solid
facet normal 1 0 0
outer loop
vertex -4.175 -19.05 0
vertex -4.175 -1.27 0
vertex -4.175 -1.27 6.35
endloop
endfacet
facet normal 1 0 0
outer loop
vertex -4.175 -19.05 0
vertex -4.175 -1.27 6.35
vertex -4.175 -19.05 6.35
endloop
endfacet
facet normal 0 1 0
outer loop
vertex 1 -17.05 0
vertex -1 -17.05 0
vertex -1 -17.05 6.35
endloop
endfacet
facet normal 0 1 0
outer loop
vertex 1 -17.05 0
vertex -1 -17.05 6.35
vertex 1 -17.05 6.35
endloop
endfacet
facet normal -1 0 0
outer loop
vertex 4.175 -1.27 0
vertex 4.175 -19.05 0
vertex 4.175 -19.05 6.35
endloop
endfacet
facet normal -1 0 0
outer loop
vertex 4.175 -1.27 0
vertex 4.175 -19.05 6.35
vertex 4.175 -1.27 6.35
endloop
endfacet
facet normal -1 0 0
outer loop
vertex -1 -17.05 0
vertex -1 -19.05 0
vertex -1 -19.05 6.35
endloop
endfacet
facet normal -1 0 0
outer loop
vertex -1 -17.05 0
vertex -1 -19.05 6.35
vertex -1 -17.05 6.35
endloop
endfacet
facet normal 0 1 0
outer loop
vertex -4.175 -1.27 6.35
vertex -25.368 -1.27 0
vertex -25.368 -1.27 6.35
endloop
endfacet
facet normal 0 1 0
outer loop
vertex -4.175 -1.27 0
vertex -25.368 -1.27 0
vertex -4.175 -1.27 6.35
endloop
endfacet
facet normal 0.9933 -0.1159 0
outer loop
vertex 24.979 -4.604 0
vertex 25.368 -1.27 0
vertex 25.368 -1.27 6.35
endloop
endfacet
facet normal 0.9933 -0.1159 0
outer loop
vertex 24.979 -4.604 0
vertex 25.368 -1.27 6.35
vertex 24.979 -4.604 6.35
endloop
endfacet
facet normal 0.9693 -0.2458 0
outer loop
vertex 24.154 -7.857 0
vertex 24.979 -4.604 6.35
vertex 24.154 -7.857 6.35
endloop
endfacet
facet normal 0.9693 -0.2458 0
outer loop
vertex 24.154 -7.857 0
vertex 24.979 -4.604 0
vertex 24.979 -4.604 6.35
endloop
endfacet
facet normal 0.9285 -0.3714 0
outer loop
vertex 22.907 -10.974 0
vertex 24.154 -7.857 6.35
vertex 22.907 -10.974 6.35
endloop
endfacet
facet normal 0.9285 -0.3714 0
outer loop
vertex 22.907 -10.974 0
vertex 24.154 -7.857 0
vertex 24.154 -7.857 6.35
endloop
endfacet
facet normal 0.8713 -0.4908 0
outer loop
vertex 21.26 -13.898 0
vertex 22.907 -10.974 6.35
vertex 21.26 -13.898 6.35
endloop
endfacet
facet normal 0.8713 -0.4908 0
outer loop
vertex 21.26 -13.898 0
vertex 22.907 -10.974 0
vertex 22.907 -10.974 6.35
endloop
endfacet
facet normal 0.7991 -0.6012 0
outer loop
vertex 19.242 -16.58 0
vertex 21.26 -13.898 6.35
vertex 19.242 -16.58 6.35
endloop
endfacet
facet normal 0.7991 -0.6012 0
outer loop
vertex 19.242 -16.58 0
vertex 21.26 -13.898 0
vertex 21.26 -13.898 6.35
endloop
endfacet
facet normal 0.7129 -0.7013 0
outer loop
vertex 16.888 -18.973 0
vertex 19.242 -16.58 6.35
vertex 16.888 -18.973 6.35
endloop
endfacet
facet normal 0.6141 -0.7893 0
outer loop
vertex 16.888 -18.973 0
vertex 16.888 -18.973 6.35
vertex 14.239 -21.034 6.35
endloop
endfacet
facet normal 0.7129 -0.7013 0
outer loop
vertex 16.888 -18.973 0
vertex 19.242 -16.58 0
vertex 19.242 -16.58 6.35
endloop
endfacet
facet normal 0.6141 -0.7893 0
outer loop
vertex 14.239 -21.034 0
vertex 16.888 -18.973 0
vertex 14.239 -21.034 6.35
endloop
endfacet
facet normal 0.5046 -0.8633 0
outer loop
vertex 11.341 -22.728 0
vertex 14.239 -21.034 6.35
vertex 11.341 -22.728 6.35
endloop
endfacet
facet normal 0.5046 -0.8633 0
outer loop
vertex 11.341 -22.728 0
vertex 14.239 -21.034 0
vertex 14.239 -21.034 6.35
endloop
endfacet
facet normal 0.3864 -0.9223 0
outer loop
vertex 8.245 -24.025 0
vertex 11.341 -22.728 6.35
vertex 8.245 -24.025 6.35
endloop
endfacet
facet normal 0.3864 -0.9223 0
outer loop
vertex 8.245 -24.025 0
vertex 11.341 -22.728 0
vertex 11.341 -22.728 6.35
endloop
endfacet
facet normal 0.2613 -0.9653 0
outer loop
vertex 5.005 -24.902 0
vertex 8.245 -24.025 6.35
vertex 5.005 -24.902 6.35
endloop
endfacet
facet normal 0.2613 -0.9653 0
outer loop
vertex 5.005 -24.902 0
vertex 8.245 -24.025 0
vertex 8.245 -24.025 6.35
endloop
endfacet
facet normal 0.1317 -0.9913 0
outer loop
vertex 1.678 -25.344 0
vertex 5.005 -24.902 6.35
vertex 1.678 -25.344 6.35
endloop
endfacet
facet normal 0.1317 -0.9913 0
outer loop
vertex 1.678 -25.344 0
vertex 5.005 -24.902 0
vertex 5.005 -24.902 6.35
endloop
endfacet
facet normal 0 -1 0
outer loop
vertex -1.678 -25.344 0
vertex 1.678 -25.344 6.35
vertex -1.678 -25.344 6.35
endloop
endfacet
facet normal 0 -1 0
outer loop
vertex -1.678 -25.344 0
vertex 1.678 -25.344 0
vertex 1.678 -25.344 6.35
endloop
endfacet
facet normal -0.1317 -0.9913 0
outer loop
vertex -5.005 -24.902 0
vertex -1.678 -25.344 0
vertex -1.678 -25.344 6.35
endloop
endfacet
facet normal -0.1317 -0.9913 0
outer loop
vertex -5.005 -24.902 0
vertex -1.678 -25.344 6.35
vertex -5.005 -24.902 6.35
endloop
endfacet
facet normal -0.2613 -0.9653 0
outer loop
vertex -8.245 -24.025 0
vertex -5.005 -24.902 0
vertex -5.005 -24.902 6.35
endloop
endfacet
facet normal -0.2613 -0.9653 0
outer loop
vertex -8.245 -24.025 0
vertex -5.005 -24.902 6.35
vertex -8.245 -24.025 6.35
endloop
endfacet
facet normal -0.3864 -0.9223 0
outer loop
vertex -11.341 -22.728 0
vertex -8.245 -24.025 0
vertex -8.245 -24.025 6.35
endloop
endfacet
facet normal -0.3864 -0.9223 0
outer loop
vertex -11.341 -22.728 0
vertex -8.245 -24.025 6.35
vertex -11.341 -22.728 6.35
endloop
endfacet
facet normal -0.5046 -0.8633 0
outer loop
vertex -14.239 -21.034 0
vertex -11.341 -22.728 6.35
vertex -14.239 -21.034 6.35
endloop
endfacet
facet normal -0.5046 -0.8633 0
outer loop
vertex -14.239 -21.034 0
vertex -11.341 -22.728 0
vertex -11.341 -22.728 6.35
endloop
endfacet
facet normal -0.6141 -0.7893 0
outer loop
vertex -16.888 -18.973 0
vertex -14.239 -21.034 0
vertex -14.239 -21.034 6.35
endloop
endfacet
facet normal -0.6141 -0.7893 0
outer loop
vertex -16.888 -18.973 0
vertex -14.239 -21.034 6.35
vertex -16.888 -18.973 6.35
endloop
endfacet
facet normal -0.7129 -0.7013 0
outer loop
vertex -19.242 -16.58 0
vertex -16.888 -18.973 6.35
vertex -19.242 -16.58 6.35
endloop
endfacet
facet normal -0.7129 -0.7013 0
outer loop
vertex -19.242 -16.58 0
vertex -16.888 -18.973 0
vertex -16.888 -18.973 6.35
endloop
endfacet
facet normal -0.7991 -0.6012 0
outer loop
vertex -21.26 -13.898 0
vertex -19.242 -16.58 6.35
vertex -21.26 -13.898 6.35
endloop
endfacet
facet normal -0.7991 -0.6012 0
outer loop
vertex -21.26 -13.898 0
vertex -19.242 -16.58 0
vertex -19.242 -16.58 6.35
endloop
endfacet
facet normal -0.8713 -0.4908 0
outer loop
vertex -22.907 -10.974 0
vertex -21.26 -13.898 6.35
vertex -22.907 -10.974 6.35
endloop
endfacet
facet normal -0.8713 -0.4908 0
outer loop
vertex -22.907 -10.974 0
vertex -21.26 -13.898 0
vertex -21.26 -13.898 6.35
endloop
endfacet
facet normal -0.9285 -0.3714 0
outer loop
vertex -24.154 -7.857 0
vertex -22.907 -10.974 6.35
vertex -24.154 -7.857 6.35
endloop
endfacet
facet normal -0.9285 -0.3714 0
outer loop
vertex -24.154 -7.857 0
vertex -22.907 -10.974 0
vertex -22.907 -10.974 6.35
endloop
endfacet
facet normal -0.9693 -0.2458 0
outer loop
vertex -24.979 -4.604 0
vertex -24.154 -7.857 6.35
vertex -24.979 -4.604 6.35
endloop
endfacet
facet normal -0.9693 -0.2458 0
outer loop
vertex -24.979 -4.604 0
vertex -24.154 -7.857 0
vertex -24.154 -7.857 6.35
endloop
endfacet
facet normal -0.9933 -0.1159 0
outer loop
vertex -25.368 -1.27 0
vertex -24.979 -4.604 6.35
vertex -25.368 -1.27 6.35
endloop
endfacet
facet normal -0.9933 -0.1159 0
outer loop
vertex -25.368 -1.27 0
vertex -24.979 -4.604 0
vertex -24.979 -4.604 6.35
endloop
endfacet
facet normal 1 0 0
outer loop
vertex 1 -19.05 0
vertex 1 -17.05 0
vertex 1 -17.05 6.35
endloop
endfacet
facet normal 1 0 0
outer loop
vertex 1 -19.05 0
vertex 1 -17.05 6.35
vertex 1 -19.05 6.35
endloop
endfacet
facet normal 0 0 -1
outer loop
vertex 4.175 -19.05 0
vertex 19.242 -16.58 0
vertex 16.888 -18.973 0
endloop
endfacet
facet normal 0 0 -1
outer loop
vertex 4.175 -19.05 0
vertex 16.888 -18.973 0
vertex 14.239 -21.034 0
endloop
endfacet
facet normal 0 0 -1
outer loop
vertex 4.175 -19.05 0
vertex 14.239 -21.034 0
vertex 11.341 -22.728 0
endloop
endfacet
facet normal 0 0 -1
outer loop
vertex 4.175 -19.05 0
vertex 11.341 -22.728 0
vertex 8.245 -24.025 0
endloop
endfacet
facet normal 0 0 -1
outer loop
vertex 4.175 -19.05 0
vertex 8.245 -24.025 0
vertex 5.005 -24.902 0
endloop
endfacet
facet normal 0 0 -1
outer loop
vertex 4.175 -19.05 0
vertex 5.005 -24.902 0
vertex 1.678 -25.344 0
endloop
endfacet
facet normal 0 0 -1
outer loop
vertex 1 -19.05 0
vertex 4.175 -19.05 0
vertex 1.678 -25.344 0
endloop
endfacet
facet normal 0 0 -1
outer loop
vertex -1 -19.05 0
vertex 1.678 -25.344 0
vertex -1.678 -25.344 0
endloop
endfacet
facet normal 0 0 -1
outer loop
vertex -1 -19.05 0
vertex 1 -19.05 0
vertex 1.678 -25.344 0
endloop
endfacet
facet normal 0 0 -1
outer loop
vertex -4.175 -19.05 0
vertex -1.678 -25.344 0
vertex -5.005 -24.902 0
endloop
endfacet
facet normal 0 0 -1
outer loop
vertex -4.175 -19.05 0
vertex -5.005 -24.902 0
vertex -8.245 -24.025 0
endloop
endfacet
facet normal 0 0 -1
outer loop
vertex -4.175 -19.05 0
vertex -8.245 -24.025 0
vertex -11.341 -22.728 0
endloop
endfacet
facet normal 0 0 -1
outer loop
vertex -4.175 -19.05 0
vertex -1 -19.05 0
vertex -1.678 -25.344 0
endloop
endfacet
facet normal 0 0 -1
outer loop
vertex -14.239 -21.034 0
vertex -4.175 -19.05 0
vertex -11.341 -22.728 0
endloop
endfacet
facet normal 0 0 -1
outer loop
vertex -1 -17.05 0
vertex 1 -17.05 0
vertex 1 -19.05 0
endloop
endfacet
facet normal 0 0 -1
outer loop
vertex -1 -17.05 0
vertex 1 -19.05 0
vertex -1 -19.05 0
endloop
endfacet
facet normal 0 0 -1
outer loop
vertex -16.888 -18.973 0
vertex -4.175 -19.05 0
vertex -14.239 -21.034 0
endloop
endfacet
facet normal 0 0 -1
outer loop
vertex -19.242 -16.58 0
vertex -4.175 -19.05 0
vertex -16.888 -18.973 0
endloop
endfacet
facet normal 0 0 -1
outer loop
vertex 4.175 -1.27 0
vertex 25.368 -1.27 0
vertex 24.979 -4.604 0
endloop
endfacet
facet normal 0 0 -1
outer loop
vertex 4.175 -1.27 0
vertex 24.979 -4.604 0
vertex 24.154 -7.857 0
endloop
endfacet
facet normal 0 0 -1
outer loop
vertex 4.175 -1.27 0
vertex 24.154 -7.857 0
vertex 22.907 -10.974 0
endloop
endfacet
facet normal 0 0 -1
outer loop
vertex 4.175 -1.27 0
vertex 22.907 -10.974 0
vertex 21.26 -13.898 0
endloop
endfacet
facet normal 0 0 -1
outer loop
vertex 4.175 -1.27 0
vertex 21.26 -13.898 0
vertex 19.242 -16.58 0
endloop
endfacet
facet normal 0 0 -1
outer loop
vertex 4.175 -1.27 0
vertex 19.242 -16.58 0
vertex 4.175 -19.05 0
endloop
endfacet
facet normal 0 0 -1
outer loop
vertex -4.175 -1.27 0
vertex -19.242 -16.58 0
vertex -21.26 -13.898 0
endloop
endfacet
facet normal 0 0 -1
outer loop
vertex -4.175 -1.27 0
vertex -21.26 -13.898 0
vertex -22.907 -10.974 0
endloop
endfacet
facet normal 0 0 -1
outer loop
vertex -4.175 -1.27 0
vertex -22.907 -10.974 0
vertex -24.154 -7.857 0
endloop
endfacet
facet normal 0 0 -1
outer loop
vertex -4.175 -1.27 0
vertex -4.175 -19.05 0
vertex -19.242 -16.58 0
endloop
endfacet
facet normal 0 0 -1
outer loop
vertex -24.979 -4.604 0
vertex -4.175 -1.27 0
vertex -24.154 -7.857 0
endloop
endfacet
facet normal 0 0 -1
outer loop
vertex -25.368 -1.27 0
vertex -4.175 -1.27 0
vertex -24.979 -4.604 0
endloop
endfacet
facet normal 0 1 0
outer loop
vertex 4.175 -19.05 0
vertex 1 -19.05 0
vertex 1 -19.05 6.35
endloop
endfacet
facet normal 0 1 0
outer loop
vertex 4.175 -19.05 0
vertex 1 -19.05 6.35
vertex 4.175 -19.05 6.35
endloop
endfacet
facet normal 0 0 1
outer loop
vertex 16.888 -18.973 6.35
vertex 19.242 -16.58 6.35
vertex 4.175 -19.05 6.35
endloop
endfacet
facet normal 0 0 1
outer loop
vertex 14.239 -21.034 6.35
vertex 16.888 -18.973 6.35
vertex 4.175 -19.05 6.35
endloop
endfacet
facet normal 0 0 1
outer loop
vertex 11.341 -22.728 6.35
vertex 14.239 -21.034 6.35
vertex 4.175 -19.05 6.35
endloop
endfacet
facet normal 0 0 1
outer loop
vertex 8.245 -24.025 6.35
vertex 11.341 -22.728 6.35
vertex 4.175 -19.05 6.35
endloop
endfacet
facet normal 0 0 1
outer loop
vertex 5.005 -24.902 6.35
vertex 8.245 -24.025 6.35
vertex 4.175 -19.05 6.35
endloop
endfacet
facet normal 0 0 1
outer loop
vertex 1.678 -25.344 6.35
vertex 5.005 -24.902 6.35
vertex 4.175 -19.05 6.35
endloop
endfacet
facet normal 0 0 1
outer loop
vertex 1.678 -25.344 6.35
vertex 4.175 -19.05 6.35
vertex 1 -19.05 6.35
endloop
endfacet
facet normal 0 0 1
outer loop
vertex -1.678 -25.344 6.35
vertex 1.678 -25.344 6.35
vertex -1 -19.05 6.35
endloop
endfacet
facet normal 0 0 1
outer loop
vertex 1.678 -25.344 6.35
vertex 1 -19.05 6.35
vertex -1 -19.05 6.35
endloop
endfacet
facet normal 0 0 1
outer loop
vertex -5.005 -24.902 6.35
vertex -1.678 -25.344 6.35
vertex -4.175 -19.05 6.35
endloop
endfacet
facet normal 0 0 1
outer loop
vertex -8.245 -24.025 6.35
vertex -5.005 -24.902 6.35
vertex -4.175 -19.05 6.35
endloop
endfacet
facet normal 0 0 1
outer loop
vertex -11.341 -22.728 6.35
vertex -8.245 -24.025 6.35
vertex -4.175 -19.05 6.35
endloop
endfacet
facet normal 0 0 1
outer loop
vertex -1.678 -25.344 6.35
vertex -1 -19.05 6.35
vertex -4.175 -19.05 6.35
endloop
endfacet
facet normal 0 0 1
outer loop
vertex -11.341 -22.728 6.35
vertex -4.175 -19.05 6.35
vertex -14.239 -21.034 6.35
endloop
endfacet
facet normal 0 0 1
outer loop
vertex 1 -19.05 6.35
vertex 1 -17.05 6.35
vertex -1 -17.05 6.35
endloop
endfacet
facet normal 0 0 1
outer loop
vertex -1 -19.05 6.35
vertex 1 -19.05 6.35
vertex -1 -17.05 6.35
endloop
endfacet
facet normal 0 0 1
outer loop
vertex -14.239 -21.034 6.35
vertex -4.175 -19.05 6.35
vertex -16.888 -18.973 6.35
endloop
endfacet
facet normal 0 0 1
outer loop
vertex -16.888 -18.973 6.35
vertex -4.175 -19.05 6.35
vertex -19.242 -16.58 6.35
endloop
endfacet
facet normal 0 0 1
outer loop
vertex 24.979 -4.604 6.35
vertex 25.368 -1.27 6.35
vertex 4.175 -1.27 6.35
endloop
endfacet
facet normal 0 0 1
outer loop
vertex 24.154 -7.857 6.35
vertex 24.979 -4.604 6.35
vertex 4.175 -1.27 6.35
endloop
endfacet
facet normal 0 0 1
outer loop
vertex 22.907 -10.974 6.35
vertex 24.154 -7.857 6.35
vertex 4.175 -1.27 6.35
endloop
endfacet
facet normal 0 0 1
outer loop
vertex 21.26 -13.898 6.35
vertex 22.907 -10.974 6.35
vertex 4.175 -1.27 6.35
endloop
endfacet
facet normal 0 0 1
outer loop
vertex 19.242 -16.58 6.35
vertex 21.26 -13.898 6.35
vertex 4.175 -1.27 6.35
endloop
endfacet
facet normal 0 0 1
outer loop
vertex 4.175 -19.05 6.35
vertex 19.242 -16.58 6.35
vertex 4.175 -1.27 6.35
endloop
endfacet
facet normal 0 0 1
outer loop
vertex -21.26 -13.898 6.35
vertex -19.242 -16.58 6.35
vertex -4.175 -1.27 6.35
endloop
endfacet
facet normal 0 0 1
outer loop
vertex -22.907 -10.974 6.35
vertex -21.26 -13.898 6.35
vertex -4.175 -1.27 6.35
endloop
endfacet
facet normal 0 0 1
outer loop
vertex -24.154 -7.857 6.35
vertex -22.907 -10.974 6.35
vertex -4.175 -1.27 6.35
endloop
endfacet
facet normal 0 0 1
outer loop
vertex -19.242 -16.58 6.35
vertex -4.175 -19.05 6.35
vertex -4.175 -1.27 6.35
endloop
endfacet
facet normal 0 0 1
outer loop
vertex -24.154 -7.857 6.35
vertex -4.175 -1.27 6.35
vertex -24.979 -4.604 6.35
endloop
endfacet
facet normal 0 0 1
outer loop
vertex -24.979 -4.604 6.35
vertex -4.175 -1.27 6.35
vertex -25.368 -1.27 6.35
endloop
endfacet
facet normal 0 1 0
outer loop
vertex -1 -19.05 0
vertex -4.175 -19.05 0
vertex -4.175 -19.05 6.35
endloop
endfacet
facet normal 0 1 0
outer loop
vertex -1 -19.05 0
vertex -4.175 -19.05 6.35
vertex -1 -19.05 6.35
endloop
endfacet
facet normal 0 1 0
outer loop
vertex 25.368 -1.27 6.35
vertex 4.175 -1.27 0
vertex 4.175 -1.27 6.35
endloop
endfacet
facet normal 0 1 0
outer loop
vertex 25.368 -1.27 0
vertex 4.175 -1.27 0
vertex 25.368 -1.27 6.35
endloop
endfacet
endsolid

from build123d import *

# Parameters (mm, degrees)
BOSS_EXTRUDE2_DEPTH = 6.35


with BuildPart() as part:
    # 3DSketch1 → Boss-Extrude2 (new body)
    with BuildSketch(Plane(origin=(4.175, -19.05, 0), x_dir=(-0.8568004384031221, 0.5156481443312075, 0), z_dir=(0, 0, -1))):
        with BuildLine():
            Line((0, 0), (9.168224006, 15.233911795))
            Line((9.168224006, 15.233911795), (-8.990144862, 26.162161584))
            ThreePointArc((-8.990144862, 26.162161584), (0.302776114, -7.593513786), (34.480876535, 0))
            Line((34.480876535, 0), (16.322507667, 10.92824979))
            Line((16.322507667, 10.92824979), (7.154283661, -4.305662005))
            Line((7.154283661, -4.305662005), (4.433942269, -2.668479147))
            Line((4.433942269, -2.668479147), (5.465238557, -0.95487827))
            Line((5.465238557, -0.95487827), (3.751637681, 0.076418019))
            Line((3.751637681, 0.076418019), (2.720341392, -1.637182858))
            Line((2.720341392, -1.637182858), (0, 0))
        make_face()
    extrude(amount=-BOSS_EXTRUDE2_DEPTH)


solid = part.part
